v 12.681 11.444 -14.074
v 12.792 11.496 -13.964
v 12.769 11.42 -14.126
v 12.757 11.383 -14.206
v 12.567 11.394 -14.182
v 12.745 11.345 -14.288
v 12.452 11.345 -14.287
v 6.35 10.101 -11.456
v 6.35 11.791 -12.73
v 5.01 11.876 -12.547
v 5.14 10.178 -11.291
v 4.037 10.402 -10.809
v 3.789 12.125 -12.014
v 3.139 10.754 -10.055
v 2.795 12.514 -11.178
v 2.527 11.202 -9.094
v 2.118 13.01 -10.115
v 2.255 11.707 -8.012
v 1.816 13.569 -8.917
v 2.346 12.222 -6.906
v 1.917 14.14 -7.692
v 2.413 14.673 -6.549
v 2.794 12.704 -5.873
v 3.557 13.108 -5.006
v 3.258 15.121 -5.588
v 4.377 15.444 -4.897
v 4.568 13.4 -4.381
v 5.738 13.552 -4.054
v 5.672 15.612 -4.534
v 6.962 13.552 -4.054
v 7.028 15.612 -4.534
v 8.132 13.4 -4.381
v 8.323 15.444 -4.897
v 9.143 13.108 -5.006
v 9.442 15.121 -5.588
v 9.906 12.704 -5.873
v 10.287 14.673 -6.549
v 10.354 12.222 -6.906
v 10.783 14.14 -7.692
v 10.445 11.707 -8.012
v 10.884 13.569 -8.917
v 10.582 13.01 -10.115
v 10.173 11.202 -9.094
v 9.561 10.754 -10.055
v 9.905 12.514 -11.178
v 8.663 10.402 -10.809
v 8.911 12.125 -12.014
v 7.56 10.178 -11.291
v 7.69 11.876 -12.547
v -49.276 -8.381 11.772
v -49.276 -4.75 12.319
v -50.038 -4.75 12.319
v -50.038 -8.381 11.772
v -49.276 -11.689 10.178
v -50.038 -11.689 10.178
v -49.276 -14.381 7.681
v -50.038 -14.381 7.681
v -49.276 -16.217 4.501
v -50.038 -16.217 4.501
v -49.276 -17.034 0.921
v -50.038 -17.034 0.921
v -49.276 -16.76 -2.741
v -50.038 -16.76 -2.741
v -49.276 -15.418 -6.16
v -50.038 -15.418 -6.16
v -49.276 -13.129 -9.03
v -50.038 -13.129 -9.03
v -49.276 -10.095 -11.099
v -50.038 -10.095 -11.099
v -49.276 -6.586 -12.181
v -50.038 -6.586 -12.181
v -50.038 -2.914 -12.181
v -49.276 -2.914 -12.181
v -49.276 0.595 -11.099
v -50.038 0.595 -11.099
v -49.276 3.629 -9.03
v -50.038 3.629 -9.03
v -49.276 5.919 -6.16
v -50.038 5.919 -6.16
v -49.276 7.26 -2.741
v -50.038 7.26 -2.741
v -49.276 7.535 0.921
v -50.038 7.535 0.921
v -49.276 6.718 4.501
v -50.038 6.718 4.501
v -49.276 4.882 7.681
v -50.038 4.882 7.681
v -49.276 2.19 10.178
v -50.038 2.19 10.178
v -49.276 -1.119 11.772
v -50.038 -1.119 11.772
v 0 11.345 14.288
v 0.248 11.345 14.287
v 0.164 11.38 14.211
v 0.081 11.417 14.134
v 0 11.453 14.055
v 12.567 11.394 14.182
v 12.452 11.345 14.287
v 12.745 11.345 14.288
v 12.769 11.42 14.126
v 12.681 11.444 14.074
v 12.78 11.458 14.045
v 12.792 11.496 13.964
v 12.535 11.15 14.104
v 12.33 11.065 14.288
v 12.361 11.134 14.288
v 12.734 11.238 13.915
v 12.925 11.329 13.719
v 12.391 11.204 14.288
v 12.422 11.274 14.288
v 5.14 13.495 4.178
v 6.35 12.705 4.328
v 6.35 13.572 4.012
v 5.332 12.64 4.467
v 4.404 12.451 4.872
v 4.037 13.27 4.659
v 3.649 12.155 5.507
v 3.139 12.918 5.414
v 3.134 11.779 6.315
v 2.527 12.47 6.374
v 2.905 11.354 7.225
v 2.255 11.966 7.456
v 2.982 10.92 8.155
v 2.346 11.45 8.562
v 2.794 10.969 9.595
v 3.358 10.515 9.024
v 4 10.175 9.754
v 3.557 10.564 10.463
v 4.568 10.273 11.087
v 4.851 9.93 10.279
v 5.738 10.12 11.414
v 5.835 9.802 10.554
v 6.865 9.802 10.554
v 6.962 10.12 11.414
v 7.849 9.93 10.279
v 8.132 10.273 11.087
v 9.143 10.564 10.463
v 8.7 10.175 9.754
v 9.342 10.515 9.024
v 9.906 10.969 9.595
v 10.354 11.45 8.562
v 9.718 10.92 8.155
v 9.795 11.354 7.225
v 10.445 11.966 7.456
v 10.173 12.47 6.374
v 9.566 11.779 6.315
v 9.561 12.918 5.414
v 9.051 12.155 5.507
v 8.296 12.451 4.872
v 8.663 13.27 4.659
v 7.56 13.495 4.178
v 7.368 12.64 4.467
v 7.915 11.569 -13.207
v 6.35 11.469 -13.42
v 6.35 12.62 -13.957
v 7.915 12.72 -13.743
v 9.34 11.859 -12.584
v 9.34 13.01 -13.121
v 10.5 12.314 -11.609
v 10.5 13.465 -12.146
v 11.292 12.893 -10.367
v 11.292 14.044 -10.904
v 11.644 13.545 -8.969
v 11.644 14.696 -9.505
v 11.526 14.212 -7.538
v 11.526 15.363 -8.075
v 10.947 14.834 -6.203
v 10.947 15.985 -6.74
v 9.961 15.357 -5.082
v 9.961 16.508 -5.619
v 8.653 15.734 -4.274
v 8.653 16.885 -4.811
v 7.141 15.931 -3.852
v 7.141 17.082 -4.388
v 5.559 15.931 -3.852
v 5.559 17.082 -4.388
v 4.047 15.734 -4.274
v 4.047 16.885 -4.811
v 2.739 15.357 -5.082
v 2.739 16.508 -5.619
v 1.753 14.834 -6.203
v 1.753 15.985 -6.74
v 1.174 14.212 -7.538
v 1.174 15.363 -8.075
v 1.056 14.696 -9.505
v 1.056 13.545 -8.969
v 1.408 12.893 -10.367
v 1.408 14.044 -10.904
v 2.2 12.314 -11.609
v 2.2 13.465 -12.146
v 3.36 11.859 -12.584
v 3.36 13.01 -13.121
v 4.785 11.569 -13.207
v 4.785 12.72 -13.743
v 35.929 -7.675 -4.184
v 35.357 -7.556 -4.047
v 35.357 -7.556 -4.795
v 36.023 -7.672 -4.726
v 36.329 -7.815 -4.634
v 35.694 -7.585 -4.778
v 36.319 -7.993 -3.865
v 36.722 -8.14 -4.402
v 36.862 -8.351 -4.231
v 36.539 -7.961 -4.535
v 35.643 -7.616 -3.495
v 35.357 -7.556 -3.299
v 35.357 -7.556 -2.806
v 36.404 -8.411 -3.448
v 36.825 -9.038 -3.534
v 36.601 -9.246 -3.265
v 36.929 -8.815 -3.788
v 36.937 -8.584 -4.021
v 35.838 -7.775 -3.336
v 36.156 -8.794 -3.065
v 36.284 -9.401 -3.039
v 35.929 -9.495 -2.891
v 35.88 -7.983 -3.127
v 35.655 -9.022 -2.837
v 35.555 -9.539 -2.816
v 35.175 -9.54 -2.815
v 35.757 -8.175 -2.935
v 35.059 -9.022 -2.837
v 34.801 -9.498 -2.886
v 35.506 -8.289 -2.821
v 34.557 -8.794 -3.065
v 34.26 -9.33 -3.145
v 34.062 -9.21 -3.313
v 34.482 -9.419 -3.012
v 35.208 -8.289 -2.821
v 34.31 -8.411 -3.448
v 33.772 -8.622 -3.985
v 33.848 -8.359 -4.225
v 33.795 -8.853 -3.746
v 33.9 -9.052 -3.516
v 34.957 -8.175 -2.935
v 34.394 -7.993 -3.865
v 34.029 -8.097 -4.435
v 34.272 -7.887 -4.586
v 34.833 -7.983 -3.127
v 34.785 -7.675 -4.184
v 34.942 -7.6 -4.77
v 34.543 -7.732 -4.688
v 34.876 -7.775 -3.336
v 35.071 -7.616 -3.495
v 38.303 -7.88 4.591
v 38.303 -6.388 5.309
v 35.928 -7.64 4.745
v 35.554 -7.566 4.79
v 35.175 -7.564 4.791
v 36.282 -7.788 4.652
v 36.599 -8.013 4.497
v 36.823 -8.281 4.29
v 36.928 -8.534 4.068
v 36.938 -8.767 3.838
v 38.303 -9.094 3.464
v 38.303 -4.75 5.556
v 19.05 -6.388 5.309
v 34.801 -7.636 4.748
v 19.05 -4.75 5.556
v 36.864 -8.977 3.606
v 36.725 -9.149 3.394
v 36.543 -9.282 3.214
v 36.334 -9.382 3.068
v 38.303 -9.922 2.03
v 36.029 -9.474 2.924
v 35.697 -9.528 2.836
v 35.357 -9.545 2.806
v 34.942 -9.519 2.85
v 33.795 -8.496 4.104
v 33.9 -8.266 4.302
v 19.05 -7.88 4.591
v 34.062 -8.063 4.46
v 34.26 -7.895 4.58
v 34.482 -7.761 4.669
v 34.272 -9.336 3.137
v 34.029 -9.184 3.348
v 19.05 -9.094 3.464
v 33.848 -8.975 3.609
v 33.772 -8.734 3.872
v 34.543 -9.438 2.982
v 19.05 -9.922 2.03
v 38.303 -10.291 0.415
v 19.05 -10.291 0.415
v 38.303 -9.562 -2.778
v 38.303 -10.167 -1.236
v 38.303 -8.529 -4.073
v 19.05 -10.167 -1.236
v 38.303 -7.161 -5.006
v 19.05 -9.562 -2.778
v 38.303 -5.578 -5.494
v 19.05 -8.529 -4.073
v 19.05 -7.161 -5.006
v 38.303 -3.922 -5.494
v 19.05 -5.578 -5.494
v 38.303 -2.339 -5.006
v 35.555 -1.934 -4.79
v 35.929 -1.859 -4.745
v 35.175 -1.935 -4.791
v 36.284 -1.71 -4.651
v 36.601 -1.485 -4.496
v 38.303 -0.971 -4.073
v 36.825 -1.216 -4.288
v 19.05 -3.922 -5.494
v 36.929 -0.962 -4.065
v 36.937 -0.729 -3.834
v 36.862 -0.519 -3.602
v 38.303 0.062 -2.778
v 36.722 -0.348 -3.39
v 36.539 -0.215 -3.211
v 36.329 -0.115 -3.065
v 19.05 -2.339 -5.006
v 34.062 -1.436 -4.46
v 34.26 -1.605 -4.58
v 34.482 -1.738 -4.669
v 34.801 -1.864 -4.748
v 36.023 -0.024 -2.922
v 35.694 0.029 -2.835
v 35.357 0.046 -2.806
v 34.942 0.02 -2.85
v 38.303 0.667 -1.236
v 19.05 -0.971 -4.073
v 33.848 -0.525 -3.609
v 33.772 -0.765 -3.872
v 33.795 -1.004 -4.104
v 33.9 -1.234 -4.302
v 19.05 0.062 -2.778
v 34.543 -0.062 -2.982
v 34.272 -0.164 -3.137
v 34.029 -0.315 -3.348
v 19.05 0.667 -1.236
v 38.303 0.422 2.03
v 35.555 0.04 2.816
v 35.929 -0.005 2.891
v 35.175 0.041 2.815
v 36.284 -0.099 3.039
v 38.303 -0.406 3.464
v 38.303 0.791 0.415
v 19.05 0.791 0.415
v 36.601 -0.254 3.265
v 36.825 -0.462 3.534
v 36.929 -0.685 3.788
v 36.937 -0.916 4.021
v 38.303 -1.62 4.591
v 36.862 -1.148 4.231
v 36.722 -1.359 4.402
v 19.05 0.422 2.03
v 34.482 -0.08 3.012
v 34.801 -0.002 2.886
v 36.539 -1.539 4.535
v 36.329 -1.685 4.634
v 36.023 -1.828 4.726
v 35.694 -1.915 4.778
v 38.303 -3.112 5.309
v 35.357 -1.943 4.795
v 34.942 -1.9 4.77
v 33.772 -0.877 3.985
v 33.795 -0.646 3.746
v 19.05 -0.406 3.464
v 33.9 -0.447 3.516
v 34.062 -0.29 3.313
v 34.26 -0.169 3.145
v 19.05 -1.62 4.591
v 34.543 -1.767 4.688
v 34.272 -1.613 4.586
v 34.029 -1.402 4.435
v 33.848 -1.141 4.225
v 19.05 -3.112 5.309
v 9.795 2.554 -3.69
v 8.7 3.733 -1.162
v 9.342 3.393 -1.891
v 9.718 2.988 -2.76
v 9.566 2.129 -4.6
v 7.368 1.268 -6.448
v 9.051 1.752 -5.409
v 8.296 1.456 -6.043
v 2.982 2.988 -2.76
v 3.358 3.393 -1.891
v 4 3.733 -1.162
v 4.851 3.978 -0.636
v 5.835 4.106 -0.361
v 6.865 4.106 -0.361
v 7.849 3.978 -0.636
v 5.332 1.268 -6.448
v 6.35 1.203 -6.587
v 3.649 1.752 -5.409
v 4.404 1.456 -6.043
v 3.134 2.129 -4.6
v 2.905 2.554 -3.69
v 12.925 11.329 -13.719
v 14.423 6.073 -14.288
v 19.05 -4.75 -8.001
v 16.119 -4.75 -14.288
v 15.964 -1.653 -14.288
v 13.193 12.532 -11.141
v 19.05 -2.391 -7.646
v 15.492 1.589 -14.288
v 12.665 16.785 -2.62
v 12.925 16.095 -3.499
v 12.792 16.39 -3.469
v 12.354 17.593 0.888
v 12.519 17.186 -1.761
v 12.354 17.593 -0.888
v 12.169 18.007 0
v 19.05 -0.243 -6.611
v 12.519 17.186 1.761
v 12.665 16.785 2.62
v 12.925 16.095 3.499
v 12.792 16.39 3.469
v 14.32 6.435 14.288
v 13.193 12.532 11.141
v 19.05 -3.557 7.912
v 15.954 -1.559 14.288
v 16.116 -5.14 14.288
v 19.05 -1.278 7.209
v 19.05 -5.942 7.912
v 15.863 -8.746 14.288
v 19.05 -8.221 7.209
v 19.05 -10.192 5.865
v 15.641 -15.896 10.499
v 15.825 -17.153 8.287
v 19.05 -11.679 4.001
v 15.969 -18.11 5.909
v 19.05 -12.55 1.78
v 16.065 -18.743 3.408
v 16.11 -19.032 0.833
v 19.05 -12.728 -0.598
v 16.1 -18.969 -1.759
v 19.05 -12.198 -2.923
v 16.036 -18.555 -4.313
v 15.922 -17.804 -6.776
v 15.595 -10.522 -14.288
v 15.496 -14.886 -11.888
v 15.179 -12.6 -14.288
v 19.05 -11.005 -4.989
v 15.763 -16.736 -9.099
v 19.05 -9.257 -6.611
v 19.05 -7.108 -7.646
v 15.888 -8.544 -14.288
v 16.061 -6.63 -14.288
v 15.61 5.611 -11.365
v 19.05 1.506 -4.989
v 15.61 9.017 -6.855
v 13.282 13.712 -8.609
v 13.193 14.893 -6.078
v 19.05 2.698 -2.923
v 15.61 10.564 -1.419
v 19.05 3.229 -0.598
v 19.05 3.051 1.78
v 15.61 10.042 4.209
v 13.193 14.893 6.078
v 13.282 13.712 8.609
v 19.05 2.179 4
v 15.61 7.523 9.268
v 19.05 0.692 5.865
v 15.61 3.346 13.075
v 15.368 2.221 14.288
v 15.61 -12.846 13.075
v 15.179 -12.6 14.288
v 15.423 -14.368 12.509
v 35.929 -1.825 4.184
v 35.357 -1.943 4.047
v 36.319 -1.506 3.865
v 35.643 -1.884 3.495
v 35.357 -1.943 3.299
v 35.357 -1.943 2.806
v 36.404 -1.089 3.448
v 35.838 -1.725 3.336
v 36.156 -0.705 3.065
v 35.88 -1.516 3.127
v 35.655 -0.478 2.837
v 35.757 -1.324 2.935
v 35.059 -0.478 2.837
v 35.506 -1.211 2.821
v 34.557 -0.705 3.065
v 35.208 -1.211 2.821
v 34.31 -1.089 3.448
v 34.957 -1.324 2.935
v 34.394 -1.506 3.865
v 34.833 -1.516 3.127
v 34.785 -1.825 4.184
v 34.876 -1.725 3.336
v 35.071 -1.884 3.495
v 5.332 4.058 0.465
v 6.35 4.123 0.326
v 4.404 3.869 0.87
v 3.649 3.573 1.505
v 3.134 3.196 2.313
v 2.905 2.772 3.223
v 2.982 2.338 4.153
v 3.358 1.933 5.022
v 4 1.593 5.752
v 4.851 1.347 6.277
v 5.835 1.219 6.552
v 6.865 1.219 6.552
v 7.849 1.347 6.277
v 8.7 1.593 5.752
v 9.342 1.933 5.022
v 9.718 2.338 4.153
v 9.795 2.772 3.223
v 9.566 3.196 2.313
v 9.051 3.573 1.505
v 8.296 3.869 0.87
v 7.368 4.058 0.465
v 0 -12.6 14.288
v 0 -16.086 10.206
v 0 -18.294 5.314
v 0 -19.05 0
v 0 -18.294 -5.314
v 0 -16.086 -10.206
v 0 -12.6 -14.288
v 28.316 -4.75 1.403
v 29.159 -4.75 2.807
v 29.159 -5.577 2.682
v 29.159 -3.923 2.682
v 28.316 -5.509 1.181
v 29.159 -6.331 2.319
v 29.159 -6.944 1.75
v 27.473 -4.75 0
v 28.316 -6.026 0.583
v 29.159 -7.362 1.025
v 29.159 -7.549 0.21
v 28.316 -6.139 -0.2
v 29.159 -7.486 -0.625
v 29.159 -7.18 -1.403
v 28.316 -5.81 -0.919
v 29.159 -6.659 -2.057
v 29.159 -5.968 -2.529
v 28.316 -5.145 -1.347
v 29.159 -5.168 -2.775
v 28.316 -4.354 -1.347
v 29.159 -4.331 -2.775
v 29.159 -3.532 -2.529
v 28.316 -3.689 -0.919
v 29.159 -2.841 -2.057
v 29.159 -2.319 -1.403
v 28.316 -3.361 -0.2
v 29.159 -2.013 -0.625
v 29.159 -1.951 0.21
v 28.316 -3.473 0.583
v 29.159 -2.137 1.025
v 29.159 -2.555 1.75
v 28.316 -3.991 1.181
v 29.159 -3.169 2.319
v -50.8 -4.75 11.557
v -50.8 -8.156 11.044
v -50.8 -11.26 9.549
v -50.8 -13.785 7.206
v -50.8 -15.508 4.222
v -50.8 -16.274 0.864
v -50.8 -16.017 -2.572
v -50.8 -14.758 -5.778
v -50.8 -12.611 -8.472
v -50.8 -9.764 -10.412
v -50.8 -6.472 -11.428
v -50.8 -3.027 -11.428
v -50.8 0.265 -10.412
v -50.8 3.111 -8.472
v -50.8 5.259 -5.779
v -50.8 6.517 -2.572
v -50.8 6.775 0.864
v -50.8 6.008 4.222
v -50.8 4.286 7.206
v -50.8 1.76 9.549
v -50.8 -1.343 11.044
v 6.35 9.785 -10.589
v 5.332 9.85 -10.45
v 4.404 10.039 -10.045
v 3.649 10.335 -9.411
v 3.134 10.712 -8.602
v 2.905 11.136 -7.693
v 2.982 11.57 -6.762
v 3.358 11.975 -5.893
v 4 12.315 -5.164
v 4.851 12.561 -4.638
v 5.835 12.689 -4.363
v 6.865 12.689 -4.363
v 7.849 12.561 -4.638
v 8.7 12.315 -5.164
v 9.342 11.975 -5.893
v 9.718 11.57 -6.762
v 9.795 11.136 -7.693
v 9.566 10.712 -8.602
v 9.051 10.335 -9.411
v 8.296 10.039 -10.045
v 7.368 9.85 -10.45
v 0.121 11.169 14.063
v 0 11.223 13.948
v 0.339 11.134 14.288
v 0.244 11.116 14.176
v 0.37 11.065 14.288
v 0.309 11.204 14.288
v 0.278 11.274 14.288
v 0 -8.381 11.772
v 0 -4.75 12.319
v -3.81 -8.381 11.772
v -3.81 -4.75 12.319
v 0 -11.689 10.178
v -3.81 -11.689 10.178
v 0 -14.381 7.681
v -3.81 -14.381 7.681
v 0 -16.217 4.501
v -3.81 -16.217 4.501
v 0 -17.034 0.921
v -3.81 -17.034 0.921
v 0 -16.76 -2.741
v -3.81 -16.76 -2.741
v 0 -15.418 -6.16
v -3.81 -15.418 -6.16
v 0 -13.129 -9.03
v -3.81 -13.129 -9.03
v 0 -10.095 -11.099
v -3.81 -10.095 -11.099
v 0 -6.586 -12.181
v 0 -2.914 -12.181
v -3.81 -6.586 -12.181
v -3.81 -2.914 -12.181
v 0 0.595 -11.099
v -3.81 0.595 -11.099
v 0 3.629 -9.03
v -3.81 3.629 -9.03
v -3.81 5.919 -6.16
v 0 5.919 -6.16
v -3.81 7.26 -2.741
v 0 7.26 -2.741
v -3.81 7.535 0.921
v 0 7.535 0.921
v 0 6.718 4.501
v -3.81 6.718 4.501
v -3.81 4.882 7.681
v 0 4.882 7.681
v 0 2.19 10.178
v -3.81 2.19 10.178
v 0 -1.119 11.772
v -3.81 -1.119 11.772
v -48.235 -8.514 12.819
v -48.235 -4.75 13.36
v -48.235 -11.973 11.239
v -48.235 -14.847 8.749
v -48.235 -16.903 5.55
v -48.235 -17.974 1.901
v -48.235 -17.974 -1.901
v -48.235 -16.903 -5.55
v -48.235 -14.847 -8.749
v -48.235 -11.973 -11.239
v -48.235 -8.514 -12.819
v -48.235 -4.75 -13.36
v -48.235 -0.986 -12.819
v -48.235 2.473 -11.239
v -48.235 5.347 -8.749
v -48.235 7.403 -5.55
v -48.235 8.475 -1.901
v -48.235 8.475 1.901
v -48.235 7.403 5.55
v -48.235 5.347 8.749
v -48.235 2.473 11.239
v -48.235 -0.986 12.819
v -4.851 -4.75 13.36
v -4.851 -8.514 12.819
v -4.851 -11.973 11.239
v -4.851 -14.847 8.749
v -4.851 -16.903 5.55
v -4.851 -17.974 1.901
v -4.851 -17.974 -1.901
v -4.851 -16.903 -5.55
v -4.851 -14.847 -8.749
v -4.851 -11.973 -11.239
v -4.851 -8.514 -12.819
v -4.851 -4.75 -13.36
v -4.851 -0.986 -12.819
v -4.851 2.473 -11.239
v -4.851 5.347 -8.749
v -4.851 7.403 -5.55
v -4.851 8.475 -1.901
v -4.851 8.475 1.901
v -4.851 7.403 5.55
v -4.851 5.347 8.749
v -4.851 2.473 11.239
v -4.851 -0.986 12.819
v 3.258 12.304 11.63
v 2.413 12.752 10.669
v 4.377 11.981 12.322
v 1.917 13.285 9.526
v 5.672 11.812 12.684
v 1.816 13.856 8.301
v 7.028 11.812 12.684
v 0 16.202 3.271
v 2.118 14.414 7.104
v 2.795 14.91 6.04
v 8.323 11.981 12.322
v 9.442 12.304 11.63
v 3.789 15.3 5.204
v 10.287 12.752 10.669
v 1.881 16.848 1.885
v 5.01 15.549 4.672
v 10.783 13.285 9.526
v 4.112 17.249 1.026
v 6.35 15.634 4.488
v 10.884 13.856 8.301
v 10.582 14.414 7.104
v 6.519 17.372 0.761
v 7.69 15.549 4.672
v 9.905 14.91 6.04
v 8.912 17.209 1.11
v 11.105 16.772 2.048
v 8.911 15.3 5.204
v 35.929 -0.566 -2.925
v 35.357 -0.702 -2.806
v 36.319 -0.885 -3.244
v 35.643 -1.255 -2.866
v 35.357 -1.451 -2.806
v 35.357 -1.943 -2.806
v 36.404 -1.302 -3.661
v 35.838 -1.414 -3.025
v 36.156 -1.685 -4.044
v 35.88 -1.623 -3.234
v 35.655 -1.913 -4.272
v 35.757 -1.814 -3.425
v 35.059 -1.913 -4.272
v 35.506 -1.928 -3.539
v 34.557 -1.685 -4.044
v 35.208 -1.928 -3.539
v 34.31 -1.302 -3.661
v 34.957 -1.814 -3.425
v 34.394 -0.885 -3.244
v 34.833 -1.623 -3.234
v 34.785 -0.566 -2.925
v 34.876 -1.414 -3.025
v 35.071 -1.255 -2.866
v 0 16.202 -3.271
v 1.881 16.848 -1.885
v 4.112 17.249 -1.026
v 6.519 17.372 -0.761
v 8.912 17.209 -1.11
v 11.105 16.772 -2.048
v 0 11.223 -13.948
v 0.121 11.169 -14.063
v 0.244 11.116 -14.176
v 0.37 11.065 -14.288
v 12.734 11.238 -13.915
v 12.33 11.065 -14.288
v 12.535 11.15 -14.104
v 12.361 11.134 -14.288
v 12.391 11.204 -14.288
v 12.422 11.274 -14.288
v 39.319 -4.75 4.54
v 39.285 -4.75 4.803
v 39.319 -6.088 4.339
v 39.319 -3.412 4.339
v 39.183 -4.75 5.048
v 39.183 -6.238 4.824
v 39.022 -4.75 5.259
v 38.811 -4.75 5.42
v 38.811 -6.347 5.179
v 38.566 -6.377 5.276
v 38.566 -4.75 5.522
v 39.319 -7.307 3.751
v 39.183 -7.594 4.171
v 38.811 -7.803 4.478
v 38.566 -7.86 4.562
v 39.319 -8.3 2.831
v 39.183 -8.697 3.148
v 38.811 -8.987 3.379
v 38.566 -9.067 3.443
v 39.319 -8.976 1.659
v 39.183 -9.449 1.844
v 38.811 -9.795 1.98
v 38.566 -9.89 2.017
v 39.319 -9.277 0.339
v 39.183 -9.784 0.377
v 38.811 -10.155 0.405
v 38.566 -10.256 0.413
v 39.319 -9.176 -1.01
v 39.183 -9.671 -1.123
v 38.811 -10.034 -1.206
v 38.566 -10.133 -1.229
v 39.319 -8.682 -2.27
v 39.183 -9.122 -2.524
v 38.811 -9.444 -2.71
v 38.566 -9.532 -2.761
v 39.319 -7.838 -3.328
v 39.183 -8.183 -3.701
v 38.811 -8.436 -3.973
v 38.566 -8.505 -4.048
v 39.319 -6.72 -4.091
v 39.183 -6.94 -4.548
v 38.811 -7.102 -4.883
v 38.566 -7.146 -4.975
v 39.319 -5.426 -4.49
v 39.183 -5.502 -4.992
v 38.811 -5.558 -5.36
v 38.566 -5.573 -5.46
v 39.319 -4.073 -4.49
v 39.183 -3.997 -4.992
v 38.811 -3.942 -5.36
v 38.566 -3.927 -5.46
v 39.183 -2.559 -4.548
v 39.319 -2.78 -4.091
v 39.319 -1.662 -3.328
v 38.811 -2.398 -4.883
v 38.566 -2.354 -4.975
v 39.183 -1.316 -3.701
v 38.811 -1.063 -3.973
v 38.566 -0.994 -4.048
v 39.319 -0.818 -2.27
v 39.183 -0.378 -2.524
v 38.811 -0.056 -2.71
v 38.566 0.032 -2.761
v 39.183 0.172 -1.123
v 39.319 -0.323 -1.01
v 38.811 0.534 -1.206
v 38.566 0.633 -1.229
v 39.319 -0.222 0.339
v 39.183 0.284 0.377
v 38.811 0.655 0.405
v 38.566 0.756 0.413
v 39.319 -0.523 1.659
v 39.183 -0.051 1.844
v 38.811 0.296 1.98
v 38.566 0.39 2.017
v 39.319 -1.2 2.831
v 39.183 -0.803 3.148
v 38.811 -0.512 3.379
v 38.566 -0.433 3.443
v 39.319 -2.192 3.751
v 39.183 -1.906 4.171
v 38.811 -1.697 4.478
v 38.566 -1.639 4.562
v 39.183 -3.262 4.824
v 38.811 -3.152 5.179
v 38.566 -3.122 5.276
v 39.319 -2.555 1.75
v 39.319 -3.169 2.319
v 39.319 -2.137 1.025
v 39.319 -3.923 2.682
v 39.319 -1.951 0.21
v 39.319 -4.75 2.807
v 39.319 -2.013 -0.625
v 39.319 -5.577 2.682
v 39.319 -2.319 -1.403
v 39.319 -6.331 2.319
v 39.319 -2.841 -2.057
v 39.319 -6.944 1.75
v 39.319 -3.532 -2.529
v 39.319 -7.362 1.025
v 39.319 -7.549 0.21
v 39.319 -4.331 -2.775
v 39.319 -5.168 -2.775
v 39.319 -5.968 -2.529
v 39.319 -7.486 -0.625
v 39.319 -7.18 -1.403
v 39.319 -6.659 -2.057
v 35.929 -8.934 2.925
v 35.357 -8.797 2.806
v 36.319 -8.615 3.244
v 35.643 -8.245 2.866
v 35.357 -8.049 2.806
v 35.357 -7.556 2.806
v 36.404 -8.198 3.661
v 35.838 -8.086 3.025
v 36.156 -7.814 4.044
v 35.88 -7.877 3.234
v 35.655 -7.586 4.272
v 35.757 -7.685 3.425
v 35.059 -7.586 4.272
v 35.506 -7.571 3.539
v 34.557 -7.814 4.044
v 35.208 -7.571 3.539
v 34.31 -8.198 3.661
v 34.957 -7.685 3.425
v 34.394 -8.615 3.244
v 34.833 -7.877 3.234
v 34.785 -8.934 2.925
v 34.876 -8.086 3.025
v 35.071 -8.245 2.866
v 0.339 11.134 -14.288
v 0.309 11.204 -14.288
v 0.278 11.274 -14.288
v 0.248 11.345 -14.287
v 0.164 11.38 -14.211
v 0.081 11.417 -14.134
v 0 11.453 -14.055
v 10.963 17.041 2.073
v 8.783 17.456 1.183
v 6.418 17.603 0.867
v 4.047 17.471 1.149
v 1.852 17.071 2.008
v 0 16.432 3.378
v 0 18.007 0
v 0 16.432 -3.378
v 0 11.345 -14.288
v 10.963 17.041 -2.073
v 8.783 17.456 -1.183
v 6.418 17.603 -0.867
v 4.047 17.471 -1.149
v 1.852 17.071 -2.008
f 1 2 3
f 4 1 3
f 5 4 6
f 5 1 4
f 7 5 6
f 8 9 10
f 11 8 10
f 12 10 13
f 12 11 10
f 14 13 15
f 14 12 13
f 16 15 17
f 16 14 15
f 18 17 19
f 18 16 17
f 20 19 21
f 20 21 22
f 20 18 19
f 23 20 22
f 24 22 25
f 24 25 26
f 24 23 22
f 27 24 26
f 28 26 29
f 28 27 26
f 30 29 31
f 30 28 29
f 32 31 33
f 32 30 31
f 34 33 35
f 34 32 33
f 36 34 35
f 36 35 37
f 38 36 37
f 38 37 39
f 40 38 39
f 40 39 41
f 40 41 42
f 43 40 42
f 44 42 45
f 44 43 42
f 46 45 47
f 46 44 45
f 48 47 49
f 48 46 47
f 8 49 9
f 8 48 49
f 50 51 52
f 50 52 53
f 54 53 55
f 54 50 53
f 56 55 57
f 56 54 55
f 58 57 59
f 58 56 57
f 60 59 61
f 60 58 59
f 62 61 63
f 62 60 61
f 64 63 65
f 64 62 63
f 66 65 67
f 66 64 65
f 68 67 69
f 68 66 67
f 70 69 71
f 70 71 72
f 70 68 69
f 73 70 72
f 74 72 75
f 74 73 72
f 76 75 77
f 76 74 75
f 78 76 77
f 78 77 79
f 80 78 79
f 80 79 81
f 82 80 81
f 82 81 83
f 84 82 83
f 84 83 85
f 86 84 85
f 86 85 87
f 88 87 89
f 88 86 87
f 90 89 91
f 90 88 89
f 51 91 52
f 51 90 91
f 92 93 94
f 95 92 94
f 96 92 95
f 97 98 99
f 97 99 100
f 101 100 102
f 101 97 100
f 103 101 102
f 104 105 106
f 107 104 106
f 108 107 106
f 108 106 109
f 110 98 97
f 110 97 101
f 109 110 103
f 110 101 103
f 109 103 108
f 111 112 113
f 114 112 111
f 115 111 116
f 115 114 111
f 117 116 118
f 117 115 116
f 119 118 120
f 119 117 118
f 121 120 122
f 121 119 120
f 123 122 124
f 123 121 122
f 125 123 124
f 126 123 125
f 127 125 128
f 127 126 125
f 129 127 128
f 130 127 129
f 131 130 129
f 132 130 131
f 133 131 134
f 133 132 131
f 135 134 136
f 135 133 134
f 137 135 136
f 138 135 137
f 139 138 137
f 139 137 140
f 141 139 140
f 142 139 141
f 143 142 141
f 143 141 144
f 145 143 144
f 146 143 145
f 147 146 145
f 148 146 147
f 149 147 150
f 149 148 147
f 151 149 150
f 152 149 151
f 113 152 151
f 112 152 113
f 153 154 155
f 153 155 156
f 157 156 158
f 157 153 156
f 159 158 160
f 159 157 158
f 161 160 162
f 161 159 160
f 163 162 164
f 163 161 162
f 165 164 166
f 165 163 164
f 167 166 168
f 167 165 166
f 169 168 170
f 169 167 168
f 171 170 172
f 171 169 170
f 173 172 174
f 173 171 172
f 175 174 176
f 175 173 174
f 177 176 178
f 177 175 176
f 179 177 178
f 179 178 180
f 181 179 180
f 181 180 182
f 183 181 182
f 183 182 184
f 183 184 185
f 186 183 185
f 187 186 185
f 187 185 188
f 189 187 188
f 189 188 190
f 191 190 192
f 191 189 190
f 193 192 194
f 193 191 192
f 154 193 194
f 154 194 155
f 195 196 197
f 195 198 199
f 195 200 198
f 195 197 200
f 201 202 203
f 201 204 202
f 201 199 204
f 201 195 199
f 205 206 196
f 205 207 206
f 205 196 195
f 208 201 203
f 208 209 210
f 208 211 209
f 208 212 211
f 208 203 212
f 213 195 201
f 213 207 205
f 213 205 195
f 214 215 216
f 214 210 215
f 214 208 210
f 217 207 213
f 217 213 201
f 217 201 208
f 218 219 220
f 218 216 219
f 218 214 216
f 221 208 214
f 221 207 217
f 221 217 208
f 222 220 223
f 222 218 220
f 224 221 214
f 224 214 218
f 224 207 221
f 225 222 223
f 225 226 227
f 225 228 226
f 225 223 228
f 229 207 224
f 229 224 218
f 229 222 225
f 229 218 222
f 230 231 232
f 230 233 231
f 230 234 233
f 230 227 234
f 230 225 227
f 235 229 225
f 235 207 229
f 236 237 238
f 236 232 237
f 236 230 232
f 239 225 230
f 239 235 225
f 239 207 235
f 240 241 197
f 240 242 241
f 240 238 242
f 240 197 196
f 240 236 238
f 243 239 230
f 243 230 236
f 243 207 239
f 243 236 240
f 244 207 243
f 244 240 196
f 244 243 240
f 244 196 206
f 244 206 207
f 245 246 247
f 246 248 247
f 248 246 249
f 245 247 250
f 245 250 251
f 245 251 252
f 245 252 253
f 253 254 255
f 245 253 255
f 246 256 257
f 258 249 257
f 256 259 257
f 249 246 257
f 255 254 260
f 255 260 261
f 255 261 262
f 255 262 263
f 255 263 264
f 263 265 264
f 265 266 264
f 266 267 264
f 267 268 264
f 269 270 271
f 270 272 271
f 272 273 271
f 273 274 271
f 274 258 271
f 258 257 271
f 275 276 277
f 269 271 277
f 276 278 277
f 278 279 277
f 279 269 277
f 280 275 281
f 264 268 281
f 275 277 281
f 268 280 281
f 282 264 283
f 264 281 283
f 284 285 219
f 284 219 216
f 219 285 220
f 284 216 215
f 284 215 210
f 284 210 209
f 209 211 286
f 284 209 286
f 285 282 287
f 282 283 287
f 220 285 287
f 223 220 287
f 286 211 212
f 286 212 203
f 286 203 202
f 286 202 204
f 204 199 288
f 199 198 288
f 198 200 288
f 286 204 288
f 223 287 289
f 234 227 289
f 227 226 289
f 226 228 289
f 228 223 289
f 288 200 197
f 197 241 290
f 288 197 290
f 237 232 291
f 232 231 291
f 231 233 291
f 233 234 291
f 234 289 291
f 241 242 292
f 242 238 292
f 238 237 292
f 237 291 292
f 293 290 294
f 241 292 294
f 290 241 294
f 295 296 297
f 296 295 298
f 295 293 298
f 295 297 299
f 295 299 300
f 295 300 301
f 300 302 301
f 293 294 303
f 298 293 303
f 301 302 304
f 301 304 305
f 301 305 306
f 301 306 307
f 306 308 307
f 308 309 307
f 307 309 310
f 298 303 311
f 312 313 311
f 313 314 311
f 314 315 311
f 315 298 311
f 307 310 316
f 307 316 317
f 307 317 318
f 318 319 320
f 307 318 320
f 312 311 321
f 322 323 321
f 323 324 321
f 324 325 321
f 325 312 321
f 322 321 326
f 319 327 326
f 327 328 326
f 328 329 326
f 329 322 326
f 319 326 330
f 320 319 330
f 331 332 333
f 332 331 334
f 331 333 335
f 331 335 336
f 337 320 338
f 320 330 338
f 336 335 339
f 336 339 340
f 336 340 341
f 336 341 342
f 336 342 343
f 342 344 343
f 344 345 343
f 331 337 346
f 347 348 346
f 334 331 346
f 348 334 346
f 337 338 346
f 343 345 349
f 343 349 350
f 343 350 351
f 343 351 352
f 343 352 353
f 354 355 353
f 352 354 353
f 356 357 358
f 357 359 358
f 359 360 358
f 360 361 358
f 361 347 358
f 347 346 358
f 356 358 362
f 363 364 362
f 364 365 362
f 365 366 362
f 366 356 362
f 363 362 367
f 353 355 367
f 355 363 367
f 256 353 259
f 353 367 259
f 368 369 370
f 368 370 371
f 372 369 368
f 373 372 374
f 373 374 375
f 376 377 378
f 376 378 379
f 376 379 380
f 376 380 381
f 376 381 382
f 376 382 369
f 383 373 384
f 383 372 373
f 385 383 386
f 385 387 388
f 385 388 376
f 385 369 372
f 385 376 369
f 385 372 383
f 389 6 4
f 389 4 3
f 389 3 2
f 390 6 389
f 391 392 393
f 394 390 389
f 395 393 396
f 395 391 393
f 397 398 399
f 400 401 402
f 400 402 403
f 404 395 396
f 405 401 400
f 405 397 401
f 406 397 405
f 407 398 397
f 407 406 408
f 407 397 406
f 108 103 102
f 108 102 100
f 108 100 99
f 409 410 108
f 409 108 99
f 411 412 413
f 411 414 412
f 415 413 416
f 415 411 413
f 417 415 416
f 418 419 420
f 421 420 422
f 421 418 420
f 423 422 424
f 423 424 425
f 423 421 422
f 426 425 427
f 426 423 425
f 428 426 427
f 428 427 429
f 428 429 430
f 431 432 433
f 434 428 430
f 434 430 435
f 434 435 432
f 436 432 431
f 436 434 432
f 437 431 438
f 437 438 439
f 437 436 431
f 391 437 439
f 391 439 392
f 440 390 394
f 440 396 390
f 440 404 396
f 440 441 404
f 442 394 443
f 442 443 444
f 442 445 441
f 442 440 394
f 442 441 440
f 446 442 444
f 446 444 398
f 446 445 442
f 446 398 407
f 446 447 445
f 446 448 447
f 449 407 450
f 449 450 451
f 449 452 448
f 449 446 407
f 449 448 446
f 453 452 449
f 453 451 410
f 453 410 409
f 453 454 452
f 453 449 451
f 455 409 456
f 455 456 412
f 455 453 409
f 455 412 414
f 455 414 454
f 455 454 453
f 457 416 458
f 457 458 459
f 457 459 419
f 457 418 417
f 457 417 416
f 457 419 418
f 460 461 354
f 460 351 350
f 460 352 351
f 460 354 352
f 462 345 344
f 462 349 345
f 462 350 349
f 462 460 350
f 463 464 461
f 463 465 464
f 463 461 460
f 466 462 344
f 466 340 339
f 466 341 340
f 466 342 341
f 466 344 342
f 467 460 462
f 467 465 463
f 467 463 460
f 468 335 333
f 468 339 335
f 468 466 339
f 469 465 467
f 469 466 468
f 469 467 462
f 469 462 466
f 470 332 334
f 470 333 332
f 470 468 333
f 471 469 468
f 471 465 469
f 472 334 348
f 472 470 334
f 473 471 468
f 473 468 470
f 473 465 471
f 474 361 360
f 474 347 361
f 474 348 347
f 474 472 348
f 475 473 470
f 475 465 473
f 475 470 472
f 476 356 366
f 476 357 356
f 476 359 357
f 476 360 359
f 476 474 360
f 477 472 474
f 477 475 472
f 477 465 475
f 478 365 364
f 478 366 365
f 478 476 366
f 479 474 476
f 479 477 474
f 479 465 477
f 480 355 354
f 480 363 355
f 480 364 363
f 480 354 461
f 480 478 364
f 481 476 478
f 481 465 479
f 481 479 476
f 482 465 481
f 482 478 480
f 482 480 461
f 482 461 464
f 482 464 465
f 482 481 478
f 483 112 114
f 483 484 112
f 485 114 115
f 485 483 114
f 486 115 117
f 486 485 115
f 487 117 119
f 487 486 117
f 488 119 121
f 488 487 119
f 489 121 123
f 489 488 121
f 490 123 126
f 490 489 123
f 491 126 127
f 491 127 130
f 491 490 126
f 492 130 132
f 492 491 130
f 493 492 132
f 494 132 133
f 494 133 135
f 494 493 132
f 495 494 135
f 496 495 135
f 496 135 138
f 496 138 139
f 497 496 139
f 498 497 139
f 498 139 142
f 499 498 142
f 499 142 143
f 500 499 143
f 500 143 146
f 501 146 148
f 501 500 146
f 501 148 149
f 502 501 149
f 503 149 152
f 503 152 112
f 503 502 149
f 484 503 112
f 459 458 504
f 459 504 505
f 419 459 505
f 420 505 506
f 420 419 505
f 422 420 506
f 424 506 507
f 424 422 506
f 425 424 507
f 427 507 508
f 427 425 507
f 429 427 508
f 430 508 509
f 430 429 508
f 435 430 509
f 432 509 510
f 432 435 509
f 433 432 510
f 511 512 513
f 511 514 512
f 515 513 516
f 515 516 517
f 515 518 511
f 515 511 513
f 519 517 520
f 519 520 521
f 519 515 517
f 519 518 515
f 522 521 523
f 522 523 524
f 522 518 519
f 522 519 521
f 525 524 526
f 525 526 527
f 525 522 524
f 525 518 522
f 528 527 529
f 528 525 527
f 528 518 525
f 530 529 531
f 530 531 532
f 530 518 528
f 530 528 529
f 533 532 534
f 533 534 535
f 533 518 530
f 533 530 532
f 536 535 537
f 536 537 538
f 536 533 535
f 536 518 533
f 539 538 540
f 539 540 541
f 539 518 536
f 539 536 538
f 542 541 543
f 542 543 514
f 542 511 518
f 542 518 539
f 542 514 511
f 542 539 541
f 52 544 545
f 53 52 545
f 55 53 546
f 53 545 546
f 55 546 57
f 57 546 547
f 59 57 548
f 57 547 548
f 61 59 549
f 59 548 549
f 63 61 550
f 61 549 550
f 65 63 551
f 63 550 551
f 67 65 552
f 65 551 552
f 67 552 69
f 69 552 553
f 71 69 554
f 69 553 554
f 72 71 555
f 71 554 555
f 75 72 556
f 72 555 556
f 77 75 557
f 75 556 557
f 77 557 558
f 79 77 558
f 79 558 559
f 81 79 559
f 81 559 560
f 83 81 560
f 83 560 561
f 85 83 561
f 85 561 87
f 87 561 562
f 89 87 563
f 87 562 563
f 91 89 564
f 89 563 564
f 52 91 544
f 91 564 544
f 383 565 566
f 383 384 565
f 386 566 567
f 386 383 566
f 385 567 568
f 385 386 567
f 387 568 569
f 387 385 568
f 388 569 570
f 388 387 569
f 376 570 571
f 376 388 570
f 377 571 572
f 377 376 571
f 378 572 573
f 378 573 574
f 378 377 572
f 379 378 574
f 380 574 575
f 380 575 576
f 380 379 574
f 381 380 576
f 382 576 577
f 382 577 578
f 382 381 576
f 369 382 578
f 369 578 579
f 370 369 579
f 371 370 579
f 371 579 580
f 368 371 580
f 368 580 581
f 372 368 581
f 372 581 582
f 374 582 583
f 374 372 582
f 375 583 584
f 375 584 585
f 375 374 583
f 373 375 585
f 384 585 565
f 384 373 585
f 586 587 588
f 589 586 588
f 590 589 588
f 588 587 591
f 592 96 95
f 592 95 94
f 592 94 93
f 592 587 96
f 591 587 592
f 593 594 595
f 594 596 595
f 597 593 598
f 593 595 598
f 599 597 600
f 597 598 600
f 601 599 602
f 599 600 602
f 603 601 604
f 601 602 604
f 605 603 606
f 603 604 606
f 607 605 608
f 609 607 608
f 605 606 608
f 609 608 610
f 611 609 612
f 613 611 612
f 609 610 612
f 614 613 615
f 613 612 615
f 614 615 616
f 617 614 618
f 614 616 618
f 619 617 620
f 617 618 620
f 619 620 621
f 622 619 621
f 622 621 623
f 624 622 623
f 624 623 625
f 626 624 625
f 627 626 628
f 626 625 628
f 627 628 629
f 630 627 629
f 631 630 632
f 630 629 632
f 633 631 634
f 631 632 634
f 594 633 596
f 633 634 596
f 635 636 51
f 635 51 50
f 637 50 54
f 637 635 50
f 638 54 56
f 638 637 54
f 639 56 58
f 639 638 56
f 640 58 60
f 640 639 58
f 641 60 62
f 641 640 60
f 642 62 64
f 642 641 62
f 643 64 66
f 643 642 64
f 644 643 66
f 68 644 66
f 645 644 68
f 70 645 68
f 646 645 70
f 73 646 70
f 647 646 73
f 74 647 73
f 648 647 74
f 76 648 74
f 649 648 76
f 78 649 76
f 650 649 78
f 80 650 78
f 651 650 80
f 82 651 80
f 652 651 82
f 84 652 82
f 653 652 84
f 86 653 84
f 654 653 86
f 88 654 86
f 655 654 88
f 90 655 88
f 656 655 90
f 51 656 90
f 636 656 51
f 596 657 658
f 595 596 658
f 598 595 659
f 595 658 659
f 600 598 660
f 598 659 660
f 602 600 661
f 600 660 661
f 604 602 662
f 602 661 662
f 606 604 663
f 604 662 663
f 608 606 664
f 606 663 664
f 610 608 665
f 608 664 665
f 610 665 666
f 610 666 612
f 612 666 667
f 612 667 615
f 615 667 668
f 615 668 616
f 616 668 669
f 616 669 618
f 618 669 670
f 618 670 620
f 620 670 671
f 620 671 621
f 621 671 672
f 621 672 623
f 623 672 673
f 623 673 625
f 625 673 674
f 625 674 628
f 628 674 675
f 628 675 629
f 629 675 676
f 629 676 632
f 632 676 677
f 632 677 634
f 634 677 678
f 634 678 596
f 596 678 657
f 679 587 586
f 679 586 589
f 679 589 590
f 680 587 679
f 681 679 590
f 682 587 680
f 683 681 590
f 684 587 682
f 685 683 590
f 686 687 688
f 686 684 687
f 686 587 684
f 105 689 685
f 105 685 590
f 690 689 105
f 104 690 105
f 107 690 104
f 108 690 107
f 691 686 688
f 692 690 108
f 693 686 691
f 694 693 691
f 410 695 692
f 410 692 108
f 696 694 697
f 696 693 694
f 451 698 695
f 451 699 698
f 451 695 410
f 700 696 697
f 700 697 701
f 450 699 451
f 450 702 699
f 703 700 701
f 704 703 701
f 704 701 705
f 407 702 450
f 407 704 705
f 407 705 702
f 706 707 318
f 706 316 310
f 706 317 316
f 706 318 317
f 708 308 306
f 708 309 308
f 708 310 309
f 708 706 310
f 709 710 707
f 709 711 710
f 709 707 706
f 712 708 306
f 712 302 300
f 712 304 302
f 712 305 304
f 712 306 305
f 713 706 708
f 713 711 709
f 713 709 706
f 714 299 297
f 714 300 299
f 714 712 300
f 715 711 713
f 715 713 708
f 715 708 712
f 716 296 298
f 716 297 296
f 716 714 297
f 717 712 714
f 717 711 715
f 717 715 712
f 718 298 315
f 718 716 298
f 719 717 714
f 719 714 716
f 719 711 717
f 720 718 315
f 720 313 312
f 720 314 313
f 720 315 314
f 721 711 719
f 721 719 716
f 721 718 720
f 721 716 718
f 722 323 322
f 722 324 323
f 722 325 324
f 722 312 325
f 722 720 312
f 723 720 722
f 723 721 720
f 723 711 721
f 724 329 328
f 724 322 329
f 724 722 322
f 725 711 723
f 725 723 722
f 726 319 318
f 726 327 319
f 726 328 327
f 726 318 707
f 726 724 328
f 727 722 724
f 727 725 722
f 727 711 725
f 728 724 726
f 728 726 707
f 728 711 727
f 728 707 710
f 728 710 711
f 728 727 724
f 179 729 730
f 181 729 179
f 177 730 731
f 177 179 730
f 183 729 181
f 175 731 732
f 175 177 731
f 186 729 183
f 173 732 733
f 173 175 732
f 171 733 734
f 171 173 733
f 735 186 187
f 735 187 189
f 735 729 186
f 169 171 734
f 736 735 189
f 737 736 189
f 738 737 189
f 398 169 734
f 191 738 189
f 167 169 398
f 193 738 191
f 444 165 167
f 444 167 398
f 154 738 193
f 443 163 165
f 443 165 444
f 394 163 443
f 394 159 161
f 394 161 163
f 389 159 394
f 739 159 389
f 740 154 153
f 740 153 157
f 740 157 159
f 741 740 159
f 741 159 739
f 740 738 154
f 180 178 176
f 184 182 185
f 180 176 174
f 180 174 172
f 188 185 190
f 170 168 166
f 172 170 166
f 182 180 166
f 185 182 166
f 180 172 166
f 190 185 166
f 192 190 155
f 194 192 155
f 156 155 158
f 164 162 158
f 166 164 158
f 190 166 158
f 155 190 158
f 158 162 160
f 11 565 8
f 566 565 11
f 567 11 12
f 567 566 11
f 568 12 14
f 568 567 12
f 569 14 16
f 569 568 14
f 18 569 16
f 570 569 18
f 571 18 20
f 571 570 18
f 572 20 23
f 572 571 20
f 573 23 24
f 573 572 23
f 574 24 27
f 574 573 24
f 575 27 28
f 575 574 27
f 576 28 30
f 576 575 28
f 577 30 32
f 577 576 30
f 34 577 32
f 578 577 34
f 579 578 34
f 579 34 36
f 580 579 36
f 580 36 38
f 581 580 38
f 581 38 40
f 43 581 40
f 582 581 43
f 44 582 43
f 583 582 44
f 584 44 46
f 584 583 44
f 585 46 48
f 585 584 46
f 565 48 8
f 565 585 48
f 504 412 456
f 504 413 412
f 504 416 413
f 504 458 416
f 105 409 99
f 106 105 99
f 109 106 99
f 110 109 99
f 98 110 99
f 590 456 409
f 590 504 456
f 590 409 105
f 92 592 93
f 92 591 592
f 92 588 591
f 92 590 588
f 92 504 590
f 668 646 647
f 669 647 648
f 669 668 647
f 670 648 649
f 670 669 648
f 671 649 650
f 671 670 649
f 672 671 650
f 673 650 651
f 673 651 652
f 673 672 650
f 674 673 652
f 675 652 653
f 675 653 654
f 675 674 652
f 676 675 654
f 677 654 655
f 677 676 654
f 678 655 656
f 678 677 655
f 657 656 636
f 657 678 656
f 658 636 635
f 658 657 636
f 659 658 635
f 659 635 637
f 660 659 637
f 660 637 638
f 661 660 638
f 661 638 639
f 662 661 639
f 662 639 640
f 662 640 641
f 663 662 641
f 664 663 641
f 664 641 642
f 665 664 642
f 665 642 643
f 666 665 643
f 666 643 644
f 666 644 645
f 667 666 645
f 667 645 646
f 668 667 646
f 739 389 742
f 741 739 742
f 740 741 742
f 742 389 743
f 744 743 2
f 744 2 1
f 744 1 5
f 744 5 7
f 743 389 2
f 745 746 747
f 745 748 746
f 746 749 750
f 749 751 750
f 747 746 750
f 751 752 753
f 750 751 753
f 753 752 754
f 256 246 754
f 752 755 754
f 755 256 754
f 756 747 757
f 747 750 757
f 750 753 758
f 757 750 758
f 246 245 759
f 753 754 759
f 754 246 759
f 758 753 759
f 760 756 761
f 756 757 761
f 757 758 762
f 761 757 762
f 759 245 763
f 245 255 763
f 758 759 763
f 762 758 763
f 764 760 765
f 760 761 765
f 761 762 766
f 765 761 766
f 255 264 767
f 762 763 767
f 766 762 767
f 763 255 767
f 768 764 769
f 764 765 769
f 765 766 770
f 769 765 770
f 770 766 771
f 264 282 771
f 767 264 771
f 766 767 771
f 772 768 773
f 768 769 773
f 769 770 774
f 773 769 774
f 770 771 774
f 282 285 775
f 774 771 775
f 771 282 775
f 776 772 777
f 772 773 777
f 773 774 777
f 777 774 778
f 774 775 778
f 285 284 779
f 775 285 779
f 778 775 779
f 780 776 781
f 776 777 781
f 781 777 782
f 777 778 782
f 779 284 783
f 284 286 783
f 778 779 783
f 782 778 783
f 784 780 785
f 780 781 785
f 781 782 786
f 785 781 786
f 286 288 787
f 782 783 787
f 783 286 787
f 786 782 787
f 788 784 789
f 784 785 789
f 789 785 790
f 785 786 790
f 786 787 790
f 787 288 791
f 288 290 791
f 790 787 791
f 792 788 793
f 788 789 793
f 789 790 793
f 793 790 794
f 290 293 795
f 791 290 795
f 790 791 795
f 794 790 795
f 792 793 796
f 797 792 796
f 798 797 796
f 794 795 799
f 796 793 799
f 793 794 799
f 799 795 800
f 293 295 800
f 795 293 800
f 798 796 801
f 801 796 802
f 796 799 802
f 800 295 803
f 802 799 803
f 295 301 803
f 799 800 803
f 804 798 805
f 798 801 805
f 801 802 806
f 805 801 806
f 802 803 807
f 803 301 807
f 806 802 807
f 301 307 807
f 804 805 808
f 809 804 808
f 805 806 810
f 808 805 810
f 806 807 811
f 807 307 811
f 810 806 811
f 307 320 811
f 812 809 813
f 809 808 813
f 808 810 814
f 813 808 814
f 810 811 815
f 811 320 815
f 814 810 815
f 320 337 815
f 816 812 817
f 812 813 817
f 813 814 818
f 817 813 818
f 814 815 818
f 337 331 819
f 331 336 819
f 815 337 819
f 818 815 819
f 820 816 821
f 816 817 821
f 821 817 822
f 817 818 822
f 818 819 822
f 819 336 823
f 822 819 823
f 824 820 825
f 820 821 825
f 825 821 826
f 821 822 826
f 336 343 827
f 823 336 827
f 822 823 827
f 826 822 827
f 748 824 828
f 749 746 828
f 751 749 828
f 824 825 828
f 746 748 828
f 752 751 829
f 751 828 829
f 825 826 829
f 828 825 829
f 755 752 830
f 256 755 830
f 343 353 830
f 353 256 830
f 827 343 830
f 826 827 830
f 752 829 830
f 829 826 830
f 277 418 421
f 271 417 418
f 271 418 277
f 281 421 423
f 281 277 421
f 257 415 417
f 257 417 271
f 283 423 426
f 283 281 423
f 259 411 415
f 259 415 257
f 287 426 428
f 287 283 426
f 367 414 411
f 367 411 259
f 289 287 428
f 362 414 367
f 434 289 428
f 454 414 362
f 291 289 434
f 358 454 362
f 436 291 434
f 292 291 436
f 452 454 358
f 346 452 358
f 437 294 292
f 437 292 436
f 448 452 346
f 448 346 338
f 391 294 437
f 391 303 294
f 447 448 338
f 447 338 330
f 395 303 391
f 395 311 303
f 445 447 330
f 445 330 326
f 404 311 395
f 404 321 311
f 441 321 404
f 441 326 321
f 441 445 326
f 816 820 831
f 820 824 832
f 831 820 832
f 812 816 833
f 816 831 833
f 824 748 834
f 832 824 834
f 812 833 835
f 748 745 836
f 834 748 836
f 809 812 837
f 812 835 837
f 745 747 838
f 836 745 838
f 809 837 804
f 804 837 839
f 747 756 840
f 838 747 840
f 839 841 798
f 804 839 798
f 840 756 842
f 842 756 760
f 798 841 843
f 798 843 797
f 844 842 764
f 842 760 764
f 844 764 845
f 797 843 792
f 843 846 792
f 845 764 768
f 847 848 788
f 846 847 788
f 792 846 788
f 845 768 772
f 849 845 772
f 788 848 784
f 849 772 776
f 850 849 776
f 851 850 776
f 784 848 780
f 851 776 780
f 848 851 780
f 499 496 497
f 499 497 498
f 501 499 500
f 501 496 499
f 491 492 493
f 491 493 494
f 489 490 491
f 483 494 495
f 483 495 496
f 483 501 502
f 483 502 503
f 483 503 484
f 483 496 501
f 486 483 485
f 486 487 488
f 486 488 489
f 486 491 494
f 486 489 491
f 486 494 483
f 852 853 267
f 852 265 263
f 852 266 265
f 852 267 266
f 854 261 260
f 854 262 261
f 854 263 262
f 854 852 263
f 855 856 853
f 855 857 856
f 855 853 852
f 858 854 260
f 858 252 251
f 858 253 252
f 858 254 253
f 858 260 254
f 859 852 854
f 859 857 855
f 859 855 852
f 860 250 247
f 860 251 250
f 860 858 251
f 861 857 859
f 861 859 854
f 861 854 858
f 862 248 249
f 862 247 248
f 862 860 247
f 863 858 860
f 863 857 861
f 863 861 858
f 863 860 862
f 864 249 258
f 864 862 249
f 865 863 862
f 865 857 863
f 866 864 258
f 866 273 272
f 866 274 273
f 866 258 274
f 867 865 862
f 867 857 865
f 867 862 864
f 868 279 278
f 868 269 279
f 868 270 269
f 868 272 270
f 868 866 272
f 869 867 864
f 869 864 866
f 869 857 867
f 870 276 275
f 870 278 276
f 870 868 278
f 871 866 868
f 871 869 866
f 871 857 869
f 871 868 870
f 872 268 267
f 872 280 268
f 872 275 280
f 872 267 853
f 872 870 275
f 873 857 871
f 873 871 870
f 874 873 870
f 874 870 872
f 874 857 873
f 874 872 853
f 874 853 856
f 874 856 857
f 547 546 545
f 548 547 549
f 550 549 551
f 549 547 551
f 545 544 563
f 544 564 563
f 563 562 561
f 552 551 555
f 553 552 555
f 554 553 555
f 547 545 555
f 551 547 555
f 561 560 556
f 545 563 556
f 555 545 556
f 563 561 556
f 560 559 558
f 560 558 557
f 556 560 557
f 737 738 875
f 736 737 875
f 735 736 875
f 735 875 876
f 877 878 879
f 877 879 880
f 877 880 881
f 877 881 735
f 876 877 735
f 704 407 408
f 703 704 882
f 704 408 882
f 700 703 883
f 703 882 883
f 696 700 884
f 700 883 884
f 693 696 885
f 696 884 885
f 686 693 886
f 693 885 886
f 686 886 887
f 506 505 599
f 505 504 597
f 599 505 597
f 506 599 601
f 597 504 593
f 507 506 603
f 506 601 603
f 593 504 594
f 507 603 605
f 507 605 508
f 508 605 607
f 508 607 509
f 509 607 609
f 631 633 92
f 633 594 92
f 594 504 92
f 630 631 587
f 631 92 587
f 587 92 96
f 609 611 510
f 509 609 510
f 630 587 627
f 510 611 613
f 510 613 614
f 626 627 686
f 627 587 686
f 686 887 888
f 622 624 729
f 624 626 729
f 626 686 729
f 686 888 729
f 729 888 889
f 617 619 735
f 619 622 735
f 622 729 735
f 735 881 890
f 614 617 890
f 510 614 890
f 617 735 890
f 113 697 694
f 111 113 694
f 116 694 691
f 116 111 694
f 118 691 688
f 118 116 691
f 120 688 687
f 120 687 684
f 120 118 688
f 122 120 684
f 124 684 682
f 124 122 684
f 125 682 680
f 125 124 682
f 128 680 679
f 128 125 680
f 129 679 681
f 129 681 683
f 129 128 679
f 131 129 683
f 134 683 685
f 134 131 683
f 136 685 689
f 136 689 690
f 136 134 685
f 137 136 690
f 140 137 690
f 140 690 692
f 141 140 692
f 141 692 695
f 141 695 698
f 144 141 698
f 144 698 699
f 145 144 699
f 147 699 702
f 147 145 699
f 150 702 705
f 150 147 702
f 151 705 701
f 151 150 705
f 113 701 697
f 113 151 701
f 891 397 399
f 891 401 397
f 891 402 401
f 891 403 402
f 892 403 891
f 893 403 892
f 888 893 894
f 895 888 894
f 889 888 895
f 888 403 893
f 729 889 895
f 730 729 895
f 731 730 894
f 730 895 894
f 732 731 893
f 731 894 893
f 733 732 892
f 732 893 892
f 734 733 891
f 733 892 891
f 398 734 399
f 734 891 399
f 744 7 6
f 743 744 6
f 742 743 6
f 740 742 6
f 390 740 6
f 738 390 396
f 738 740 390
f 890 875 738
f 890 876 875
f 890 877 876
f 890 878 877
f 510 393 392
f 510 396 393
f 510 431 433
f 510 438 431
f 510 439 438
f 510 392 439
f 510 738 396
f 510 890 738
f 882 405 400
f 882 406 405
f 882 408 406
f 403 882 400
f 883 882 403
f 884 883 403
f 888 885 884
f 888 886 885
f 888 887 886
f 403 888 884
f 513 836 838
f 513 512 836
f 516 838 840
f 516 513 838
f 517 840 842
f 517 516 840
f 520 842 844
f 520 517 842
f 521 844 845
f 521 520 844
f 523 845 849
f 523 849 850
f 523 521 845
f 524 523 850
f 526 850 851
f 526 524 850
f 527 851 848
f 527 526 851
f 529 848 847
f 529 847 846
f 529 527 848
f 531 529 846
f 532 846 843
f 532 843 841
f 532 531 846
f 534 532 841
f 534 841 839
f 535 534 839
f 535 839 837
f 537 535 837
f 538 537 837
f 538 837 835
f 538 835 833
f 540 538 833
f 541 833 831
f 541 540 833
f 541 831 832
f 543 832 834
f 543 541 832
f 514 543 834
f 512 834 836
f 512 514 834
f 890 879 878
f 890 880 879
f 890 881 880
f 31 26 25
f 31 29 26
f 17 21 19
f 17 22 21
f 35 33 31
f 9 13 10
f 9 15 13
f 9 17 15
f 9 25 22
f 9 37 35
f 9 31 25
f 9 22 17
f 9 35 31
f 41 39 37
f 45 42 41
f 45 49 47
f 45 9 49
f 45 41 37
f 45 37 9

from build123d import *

# Parameters (mm, degrees)
SKETCH1_R           = 19.05
EXTRUDE1_DEPTH      = 19.05
EXTRUDE1_DEPTH_BACK = 50.8
CUT_EXTRUDE1_REACH  = 52.8
SKETCH2_R           = 19.05
SKETCH2_R_2         = 13.3604
CUT_EXTRUDE3_REACH  = 21.05
SKETCH19_R          = 8.6614
CUT_EXTRUDE4_DEPTH  = 0.254
SKETCH20_R          = 8.6614
CUT_EXTRUDE5_DEPTH  = 0.254
CHAMFER1_SIZE       = 0.762
SKETCH15_R          = 5.3086
EXTRUDE2_DEPTH      = 1.27
CIRPATTERN1_COUNT   = 4


with BuildPart() as part:
    # Sketch1 → Extrude1 (new body, two sides)
    with BuildSketch(Plane(origin=(0, 0, 0), x_dir=(0, 0, -1), z_dir=(1, 0, 0))) as extrude1_sk:
        Circle(SKETCH1_R)
    extrude(amount=EXTRUDE1_DEPTH)
    extrude(extrude1_sk.sketch, amount=-EXTRUDE1_DEPTH_BACK)

    # Sketch2 → Cut-Extrude1 (cut, up to next)
    with BuildSketch(Plane(origin=(0, 0, 0), x_dir=(0, 0, -1), z_dir=(1, 0, 0)), mode=Mode.PRIVATE) as cut_extrude1_sk1:
        Circle(SKETCH2_R)
        with Locations((0, -4.7498)):
            Circle(SKETCH2_R_2, mode=Mode.SUBTRACT)
    cut_extrude1_tool1 = extrude(cut_extrude1_sk1.sketch, amount=-CUT_EXTRUDE1_REACH, mode=Mode.PRIVATE) & part.part
    add(cut_extrude1_tool1.solids().sort_by_distance((0, 0, 18.511185))[0], mode=Mode.SUBTRACT)

    # Sketch4 → Cut-Extrude3 (cut, up to next)
    with BuildSketch(Plane.ZY, mode=Mode.PRIVATE) as cut_extrude3_sk1:
        with BuildLine():
            Line((14.2875, -12.600390619), (14.2875, 11.344778237))
            Line((14.2875, 11.344778237), (0, 18.007148903))
            Line((0, 18.007148903), (-14.2875, 11.344778237))
            Line((-14.2875, 11.344778237), (-14.2875, -12.600390619))
            ThreePointArc((-14.2875, -12.600390619), (0, 19.05), (14.2875, -12.600390619))
        make_face()
    cut_extrude3_tool1 = extrude(cut_extrude3_sk1.sketch, amount=-CUT_EXTRUDE3_REACH, mode=Mode.PRIVATE) & part.part
    add(cut_extrude3_tool1.solids().sort_by_distance((0, -0.627806, 14.782814))[0], mode=Mode.SUBTRACT)

    # Sketch6 → Cut-Revolve2 (revolve, cut)
    with BuildSketch(Plane.XY, mode=Mode.PRIVATE) as cut_revolve2_sk:
        Polygon((12.169188023, 18.007148903), (19.05, 3.2512), (19.05, 18.007148903), align=None)
    revolve(cut_revolve2_sk.sketch.rotate(Axis((1.987224567, -4.7498, 0), (1, 0, 0)), 270), axis=Axis((1.987224567, -4.7498, 0), (1, 0, 0)), mode=Mode.SUBTRACT)  # turned: the seam where the file's is

    # S2D0002 → Cut-Revolve3 (revolve, cut)
    with BuildSketch(Plane(origin=(6.35, 13.712414668, 8.609072086), x_dir=(0, 0.422618262, -0.906307787), z_dir=(1, 0, 0))):
        Polygon((0, 0), (4.5466, 0), (4.106586662, -2.0701), (3.4544, -2.722286662), (3.4544, -12.192), (0, -12.192), align=None)
    revolve(axis=Axis((6.35, 2.110224902, 3.198882147), (0, 0.906307787, 0.422618262)), mode=Mode.SUBTRACT)

    # Sketch19 → Cut-Extrude4 (cut)
    with BuildSketch(Plane(origin=(0, 14.790960552, 6.897138177), x_dir=(1, 0, 0), z_dir=(0, 0.906307787, 0.422618262))):
        with Locations((6.35, -2.00735222)):
            Circle(SKETCH19_R)
    extrude(amount=-CUT_EXTRUDE4_DEPTH, mode=Mode.SUBTRACT)

    # Sketch8 → Cut-Revolve4 (revolve, cut)
    with BuildSketch(Plane(origin=(6.35, 13.712414668, -8.609072086), x_dir=(0, -0.422618262, -0.906307787), z_dir=(1, 0, 0))):
        Polygon((0, 0), (4.5466, 0), (4.106586662, -2.0701), (3.4544, -2.722286662), (3.4544, -12.192), (0, -12.192), align=None)
    revolve(axis=Axis((6.35, 2.110224902, -3.198882147), (0, 0.906307787, -0.422618262)), mode=Mode.SUBTRACT)

    # Sketch20 → Cut-Extrude5 (cut)
    with BuildSketch(Plane(origin=(0, 14.790960552, -6.897138177), x_dir=(1, 0, 0), z_dir=(0, 0.906307787, -0.422618262))):
        with Locations((6.35, 2.00735222)):
            Circle(SKETCH20_R)
    extrude(amount=-CUT_EXTRUDE5_DEPTH, mode=Mode.SUBTRACT)

    # Sketch10 → Cut-Revolve6 (revolve, cut)
    with BuildSketch(Plane.XY, mode=Mode.PRIVATE) as cut_revolve6_sk:
        Polygon((0, 8.6106), (0, 7.5692), (-3.81, 7.5692), (-4.8514, 8.6106), align=None)
    revolve(cut_revolve6_sk.sketch.rotate(Axis((-5.09397, -4.7498, 0), (1, 0, 0)), 90), axis=Axis((-5.09397, -4.7498, 0), (1, 0, 0)), mode=Mode.SUBTRACT)  # turned: the seam where the file's is

    # Sketch12 → Cut-Revolve8 (revolve, cut)
    with BuildSketch(Plane.XY, mode=Mode.PRIVATE) as cut_revolve8_sk:
        Polygon((-50.8, 8.6106), (-50.8, 7.5692), (-49.276, 7.5692), (-48.2346, 8.6106), align=None)
    revolve(cut_revolve8_sk.sketch.rotate(Axis((-50.92827, -4.7498, 0), (1, 0, 0)), 90), axis=Axis((-50.92827, -4.7498, 0), (1, 0, 0)), mode=Mode.SUBTRACT)  # turned: the seam where the file's is

    # Chamfer1
    chamfer1_edges = [part.edges().sort_by_distance(p)[0] for p in [
        (-50.8, -4.7498, -12.319),
    ]]
    chamfer(chamfer1_edges, length=CHAMFER1_SIZE)

    # Sketch13 → Revolve1 (revolve)
    with BuildSketch(Plane(origin=(0, 0, 0), x_dir=(0, -1, 0), z_dir=(0, 0, 1)), mode=Mode.PRIVATE) as revolve1_sk:
        with BuildLine():
            Line((4.7498, 19.05), (4.7498, 39.3192))
            Line((4.7498, 39.3192), (9.29005, 39.3192))
            ThreePointArc((9.29005, 39.3192), (10.00847049, 39.02162049), (10.30605, 38.3032))
            Line((10.30605, 38.3032), (10.30605, 19.05))
            Line((10.30605, 19.05), (4.7498, 19.05))
        make_face()
    revolve(revolve1_sk.sketch.rotate(Axis((18.03654, -4.7498, 0), (1, 0, 0)), 270), axis=Axis((18.03654, -4.7498, 0), (1, 0, 0)))  # turned: the seam where the file's is

    # S2D0001 → Cut-Revolve9 (revolve, cut)
    with BuildSketch(Plane(origin=(39.3192, -7.5565, 0), x_dir=(0, -1, 0), z_dir=(0, 0, 1)), mode=Mode.PRIVATE) as cut_revolve9_sk:
        Polygon((0, 0), (0, -10.16), (-2.8067, -11.846435499), (-2.8067, 0), align=None)
    revolve(cut_revolve9_sk.sketch.rotate(Axis((26.880442726, -4.7498, 0), (1, 0, 0)), 270), axis=Axis((26.880442726, -4.7498, 0), (1, 0, 0)), mode=Mode.SUBTRACT)  # turned: the seam where the file's is

    # Sketch15 → Extrude2 (add)
    with BuildSketch(Plane(origin=(19.05, 14.560758374, -6.789793138), x_dir=(0, -0.422618262, -0.906307787), z_dir=(0, -0.906307787, 0.422618262))):
        with Locations((2.00735222, -12.7)):
            Circle(SKETCH15_R)
    extrude(amount=-EXTRUDE2_DEPTH)

    # Sketch16 → Cut-Revolve10 (revolve, cut)
    with BuildSketch(Plane(origin=(35.3568, -0.820937947, -3.928862053), x_dir=(-1, 0, 0), z_dir=(0, -0.707106781, -0.707106781)), mode=Mode.PRIVATE) as cut_revolve10_sk:
        Polygon((0, 0), (1.5875, 0), (0, -1.5875), align=None)
    cut_revolve10 = revolve(cut_revolve10_sk.sketch.rotate(Axis((35.3568, -3.280818463, -1.468981537), (0, 0.707106781, -0.707106781)), 90), axis=Axis((35.3568, -3.280818463, -1.468981537), (0, 0.707106781, -0.707106781)), mode=Mode.SUBTRACT)  # turned: the seam where the file's is

    # CirPattern1: Cut-Revolve10 ×4 about axis
    cirpattern1_axis = Axis((18.03654, -4.7498, 0), (-1, 0, 0))
    for i in range(1, CIRPATTERN1_COUNT):
        add(cut_revolve10.rotate(cirpattern1_axis, i * 360 / CIRPATTERN1_COUNT), mode=Mode.SUBTRACT)


solid = part.part
